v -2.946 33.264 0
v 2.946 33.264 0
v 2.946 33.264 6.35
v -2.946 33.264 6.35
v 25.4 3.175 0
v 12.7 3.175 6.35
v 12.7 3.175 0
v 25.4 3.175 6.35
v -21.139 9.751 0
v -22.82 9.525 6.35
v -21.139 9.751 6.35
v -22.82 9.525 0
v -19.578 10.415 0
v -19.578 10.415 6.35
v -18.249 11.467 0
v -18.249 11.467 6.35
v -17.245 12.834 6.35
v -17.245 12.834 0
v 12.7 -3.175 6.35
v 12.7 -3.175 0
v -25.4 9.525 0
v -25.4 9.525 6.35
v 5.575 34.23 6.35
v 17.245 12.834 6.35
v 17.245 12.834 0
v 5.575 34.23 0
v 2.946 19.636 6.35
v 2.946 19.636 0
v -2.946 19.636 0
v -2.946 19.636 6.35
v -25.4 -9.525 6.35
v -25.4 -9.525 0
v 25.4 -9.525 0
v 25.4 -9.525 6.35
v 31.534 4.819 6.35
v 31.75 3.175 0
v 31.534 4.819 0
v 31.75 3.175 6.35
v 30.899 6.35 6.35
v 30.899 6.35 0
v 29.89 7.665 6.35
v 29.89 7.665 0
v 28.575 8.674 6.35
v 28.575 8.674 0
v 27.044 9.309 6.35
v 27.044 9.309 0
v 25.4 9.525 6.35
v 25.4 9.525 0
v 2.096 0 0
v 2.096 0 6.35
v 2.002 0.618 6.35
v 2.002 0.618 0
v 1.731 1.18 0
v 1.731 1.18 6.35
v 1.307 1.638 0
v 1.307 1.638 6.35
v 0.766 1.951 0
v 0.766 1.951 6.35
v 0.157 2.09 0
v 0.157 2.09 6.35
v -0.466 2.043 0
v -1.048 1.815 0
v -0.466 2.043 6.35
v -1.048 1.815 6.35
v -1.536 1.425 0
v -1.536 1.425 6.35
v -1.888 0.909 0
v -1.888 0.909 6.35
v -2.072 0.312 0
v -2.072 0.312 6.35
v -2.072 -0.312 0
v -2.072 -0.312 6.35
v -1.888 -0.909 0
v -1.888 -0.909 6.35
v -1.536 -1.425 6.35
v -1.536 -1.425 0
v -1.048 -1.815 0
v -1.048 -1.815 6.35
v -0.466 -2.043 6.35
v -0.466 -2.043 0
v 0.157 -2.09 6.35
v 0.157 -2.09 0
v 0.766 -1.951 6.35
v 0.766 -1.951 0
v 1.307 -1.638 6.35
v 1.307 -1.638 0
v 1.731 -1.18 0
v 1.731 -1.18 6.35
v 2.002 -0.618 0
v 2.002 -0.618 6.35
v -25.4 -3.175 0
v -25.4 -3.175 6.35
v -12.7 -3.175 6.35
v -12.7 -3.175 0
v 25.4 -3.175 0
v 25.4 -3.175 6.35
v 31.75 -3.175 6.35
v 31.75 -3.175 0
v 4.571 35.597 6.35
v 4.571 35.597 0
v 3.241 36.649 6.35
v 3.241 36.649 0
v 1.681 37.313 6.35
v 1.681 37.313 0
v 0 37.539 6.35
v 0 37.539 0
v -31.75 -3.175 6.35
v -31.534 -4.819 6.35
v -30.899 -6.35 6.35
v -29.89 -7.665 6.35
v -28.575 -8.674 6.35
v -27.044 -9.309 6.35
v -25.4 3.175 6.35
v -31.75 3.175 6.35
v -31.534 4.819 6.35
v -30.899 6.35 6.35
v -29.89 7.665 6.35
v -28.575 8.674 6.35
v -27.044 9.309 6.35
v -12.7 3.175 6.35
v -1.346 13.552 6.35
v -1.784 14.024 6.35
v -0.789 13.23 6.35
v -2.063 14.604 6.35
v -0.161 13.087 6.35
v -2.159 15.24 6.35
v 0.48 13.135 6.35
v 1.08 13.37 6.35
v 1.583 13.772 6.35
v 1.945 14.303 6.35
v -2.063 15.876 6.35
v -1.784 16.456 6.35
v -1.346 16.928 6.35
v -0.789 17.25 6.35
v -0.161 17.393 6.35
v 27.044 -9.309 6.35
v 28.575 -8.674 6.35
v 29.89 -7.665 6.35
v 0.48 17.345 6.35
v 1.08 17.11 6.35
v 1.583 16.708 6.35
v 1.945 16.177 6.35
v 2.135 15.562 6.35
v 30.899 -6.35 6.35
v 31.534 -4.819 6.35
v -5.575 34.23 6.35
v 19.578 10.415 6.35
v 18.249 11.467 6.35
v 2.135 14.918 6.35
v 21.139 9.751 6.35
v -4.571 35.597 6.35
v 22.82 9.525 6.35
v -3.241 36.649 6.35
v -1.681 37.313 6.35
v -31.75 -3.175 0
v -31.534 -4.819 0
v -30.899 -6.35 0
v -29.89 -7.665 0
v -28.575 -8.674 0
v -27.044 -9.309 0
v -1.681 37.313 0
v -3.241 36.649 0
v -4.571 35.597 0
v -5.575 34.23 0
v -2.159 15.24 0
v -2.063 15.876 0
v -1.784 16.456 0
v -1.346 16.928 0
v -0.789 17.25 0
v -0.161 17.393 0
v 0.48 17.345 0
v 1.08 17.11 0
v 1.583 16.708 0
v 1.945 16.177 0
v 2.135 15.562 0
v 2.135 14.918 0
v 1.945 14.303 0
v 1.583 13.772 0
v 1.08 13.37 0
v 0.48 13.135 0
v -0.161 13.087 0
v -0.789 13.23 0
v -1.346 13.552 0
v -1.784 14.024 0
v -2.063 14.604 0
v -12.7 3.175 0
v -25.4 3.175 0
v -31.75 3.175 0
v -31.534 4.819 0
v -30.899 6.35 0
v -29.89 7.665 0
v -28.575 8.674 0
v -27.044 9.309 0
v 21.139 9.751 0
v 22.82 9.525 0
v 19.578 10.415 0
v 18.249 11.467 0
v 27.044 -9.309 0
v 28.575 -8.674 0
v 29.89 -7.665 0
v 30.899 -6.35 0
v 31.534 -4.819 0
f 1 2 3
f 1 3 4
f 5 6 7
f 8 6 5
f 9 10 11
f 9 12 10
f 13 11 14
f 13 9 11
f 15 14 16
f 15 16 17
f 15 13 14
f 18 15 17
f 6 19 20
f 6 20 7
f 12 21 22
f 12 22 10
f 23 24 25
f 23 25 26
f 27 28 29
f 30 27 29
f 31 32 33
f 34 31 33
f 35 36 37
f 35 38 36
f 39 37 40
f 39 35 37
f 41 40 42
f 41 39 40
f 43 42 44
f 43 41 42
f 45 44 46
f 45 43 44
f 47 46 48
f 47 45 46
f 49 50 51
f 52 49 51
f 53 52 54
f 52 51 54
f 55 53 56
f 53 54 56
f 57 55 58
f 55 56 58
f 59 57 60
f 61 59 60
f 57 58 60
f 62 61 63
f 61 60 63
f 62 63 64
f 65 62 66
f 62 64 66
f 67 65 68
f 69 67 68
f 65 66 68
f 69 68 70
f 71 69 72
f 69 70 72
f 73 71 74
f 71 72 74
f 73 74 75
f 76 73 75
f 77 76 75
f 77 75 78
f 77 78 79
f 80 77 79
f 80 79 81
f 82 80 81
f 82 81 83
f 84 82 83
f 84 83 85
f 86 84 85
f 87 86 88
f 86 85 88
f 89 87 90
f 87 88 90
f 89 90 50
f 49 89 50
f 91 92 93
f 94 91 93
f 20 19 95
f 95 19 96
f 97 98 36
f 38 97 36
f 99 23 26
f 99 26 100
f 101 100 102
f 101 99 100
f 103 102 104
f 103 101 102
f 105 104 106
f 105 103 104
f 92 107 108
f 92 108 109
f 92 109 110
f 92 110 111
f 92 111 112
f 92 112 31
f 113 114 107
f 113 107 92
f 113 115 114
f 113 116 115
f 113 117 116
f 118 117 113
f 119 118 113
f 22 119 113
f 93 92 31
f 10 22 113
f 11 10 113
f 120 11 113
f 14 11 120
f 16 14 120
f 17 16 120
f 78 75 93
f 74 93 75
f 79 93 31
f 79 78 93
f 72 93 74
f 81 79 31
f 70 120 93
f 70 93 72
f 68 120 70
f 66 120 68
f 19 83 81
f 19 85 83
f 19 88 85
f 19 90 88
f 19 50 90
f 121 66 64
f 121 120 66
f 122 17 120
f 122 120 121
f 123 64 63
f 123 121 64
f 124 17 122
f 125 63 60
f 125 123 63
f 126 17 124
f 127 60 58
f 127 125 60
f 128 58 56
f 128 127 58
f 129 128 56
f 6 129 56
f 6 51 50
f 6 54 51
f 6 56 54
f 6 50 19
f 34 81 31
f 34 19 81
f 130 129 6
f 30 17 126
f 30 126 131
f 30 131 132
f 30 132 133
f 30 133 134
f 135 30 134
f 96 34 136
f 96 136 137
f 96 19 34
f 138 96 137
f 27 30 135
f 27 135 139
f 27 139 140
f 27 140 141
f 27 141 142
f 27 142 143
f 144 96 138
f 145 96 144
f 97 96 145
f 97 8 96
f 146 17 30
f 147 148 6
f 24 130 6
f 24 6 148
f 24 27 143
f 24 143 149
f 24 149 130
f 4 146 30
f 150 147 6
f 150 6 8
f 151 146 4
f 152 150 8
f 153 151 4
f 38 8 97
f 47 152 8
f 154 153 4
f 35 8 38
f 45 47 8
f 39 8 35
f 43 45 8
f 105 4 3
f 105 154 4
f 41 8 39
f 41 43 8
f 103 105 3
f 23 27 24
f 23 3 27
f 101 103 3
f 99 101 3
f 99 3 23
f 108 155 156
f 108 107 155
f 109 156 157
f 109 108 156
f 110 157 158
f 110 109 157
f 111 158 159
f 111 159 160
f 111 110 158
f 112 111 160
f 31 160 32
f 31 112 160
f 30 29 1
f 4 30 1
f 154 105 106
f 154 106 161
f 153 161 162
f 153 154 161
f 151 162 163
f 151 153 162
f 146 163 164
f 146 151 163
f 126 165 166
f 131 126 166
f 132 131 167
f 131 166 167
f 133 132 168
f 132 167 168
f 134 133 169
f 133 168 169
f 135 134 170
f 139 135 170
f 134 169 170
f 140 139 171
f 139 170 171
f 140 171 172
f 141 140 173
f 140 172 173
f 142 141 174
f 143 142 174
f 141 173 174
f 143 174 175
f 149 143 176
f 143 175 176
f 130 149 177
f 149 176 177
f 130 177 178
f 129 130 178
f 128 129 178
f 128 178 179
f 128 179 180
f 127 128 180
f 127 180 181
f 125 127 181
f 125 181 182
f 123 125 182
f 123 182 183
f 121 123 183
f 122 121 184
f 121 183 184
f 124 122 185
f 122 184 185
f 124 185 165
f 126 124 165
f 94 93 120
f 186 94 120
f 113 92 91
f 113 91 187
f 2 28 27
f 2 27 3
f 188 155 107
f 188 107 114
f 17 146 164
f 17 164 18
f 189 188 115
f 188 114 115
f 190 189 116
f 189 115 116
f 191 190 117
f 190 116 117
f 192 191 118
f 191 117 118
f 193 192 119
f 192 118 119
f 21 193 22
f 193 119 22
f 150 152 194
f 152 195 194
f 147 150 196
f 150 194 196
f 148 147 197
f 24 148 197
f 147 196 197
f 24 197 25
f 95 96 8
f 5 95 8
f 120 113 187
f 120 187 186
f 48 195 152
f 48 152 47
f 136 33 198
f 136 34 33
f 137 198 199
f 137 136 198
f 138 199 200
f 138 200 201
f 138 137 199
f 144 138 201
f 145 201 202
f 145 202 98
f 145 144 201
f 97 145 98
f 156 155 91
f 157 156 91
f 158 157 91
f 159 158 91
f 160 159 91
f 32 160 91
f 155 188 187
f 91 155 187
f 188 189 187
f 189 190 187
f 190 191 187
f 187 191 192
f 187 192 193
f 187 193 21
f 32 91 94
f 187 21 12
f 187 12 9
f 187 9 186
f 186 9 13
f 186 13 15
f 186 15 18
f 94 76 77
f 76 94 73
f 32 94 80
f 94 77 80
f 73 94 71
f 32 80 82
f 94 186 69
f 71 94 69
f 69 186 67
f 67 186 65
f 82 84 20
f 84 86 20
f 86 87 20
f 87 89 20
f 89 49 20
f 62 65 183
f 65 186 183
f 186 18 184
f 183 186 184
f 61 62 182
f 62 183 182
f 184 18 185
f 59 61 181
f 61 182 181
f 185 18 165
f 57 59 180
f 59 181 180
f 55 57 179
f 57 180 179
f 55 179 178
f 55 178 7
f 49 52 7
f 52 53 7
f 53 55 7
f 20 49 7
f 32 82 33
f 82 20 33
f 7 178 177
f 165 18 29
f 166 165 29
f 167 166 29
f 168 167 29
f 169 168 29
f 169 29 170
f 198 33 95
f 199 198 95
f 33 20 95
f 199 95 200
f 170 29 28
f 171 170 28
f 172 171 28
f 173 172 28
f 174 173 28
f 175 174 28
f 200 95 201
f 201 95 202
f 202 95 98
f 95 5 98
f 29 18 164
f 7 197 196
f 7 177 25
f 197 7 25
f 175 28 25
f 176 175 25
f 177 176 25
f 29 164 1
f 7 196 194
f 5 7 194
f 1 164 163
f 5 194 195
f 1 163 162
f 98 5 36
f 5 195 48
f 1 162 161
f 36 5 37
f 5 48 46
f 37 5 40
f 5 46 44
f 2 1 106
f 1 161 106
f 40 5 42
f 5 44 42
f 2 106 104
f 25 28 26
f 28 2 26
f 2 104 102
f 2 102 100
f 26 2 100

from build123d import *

# Parameters (mm, degrees)
SKETCH1_W           = 63.5
SKETCH1_H           = 19.05
BOSS_EXTRUDE1_DEPTH = 6.35
SKETCH2_R           = 2.0955
SKETCH2_W           = 12.7
SKETCH2_H           = 6.35
CUT_EXTRUDE1_DEPTH  = 6.35
BOSS_EXTRUDE2_DEPTH = 6.35
SKETCH4_R           = 2.159
SKETCH4_W           = 5.8928
SKETCH4_H           = 13.6271
CUT_EXTRUDE3_DEPTH  = 6.35
FILLET1_R           = 6.35


with BuildPart() as part:
    # Sketch1 → Boss-Extrude1 (new body)
    with BuildSketch(Plane.XY):
        Rectangle(SKETCH1_W, SKETCH1_H)
    extrude(amount=BOSS_EXTRUDE1_DEPTH)

    # Sketch2 → Cut-Extrude1 (cut)
    with BuildSketch(Plane.XY.offset(6.35)):
        Circle(SKETCH2_R)
        with Locations((-19.05, 0)):
            Rectangle(SKETCH2_W, SKETCH2_H)
        with Locations((19.05, 0)):
            Rectangle(SKETCH2_W, SKETCH2_H)
    extrude(amount=-CUT_EXTRUDE1_DEPTH, mode=Mode.SUBTRACT)

    # Sketch3 → Boss-Extrude2 (add)
    with BuildSketch(Plane.XY.offset(6.35)):
        with BuildLine():
            Line((-19.05, 9.525), (0, 9.525))
            Line((0, 9.525), (0, 24.839121342))
            ThreePointArc((0, 24.839121342), (-5.460357863, 27.947672283), (-5.574636807, 34.229832521))
            Line((-5.574636807, 34.229832521), (-19.05, 9.525))
        make_face()
        with BuildLine():
            ThreePointArc((-5.574636807, 34.229832521), (-5.460357863, 27.947672283), (0, 24.839121342))
            Line((0, 24.839121342), (0, 37.539121342))
            ThreePointArc((0, 37.539121342), (-3.24144906, 36.649479205), (-5.574636807, 34.229832521))
        make_face()
        with BuildLine():
            Line((0, 37.539121342), (0, 24.839121342))
            ThreePointArc((0, 24.839121342), (4.490128061, 26.698993282), (6.35, 31.189121342))
            ThreePointArc((6.35, 31.189121342), (6.15310672, 32.758126662), (5.574636947, 34.229832265))
            ThreePointArc((5.574636947, 34.229832265), (3.241449185, 36.649479131), (0, 37.539121342))
        make_face()
        with BuildLine():
            Line((0, 24.839121342), (0, 9.525))
            Line((0, 9.525), (19.05, 9.525))
            Line((19.05, 9.525), (5.574636947, 34.229832265))
            ThreePointArc((5.574636947, 34.229832265), (6.15310672, 32.758126662), (6.35, 31.189121342))
            ThreePointArc((6.35, 31.189121342), (4.490128061, 26.698993282), (0, 24.839121342))
        make_face()
    extrude(amount=-BOSS_EXTRUDE2_DEPTH)

    # Sketch4 → Cut-Extrude3 (cut)
    with BuildSketch(Plane(origin=(0, 0, 0), x_dir=(-1, 0, 0), z_dir=(0, 0, -1))):
        with Locations((0, 15.24)):
            Circle(SKETCH4_R)
        with Locations((0, 26.449976884)):
            Rectangle(SKETCH4_W, SKETCH4_H)
    extrude(amount=-CUT_EXTRUDE3_DEPTH, mode=Mode.SUBTRACT)

    # Fillet1
    fillet1_edges = [part.edges().sort_by_distance(p)[0] for p in [
        (31.75, -9.525, 3.175),
        (31.75, 9.525, 3.175),
        (19.05, 9.525, 3.175),
        (-31.75, -9.525, 3.175),
        (-31.75, 9.525, 3.175),
        (-19.05, 9.525, 3.175),
    ]]
    fillet(fillet1_edges, radius=FILLET1_R)


solid = part.part
